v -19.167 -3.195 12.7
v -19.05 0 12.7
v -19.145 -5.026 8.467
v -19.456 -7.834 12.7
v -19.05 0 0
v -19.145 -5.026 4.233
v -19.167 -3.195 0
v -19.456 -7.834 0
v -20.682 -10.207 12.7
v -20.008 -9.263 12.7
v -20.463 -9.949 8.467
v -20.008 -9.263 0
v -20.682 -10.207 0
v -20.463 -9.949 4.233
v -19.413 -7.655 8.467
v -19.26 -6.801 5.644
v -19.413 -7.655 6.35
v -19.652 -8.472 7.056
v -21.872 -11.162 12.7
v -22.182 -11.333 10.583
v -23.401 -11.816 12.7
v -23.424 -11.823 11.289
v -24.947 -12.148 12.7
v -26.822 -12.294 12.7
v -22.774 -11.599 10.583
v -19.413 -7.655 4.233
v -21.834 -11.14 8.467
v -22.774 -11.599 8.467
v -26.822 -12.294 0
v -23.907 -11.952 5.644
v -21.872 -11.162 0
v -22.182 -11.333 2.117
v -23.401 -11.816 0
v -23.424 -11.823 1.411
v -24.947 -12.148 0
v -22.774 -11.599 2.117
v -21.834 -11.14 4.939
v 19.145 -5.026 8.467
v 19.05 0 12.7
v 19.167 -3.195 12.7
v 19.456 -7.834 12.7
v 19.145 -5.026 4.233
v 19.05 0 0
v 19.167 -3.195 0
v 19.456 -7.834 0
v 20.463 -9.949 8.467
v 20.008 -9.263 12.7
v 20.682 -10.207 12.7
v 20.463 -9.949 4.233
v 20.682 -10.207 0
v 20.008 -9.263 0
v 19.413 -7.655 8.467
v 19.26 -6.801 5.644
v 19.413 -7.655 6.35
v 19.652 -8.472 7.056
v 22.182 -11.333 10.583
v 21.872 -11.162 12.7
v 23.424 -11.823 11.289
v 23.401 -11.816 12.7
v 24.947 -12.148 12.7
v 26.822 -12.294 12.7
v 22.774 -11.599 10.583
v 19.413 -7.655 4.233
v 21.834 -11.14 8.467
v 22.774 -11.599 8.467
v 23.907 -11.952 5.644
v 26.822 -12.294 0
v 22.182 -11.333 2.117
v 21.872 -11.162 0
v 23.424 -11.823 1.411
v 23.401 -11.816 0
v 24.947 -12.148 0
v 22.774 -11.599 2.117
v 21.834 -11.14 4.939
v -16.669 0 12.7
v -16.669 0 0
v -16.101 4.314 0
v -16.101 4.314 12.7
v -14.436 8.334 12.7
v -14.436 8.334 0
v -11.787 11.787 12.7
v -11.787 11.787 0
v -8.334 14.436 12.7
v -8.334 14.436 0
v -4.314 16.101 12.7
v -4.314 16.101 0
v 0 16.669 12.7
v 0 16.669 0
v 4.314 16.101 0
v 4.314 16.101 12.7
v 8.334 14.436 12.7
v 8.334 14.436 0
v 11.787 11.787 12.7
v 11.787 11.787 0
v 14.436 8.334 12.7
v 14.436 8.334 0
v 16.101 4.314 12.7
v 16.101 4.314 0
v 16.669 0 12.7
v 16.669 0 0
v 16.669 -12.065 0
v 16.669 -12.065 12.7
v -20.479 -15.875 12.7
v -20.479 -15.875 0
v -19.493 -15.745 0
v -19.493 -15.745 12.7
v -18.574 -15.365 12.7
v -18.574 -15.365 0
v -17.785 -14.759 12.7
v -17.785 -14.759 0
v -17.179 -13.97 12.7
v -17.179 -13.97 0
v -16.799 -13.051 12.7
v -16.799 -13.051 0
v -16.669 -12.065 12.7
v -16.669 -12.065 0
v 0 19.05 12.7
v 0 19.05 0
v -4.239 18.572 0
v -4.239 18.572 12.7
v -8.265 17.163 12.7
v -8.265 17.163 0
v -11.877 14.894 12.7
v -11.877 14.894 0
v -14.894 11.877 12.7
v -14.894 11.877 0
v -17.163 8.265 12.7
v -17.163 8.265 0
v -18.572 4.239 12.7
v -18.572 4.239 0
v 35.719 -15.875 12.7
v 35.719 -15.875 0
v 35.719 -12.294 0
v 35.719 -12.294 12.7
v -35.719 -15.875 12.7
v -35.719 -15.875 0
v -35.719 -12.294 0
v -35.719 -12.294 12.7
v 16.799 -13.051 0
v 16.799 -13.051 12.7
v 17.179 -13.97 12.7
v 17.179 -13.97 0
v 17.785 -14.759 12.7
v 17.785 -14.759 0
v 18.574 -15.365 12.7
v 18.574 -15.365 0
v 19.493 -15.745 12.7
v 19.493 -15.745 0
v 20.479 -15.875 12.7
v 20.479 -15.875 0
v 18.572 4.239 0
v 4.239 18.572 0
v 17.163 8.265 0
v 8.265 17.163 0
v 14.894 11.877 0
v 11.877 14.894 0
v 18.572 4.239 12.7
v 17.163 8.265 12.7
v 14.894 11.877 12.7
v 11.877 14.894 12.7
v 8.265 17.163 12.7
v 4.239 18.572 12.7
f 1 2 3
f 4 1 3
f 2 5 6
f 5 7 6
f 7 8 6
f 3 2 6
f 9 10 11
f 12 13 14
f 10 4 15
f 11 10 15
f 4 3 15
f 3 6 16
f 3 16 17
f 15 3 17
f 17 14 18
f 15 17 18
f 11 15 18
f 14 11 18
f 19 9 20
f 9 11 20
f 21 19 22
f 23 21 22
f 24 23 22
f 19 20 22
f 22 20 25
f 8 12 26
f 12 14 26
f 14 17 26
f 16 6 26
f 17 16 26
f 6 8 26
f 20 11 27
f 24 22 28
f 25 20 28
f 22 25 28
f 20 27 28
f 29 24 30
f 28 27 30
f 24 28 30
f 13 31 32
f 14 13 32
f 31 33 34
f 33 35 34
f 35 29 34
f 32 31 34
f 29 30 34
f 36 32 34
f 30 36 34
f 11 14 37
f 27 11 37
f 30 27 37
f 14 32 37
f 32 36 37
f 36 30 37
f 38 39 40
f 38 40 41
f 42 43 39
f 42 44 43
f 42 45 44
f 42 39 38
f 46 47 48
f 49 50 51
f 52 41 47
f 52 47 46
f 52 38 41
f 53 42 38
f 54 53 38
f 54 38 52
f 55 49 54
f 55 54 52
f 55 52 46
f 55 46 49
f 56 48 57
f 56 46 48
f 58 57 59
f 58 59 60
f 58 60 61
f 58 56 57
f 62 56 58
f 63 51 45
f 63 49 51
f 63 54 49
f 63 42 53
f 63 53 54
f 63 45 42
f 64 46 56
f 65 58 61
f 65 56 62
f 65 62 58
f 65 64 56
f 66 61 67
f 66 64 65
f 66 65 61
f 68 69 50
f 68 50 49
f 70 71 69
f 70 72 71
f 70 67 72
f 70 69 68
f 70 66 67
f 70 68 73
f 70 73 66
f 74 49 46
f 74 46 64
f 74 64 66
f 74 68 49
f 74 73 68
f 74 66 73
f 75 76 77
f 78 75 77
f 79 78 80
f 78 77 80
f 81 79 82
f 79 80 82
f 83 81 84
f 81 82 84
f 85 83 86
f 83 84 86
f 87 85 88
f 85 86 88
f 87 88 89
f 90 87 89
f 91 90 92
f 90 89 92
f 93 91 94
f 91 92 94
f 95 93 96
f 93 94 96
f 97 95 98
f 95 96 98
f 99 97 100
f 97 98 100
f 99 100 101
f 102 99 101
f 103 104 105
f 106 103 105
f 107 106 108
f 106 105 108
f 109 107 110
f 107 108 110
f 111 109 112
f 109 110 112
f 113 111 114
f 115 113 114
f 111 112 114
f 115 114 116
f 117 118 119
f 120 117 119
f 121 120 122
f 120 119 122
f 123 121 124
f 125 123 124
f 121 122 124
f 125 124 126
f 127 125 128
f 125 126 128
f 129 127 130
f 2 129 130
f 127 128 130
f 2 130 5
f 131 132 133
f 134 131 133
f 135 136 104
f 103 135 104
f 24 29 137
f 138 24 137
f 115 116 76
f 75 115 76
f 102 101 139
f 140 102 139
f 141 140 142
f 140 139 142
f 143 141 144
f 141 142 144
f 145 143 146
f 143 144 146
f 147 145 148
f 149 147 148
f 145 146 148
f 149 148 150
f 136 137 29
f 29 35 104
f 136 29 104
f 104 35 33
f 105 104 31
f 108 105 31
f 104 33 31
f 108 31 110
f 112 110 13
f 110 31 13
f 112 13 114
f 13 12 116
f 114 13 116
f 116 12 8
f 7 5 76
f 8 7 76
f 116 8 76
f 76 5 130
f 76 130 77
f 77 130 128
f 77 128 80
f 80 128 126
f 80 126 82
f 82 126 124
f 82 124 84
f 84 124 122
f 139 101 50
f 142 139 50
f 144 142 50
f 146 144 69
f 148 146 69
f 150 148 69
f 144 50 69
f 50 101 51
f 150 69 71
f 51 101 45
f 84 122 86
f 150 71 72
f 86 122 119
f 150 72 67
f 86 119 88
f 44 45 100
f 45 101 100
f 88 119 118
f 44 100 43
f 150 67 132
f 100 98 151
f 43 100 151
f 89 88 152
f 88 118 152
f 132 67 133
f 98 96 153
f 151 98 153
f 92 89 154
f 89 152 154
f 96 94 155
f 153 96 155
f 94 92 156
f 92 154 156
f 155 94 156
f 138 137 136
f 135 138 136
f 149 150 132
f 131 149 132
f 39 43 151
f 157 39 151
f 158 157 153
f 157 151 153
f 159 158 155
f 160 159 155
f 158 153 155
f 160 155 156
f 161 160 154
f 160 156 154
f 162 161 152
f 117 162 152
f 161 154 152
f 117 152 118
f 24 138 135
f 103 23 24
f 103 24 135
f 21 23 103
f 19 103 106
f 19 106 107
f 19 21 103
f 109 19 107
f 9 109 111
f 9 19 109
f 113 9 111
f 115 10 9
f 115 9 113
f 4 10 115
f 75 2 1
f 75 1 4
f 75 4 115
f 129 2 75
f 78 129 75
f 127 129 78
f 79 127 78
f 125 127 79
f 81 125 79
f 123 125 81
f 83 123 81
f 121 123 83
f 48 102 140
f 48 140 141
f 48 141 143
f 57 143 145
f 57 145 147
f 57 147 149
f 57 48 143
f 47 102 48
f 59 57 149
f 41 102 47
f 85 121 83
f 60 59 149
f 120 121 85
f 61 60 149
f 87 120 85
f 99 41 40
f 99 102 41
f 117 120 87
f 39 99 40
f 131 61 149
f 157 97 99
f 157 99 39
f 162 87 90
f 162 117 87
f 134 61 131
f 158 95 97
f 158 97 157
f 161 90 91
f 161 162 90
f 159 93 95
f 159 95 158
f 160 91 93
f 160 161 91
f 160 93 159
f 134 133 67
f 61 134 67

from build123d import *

# Parameters (mm, degrees)
F1_DEPTH = 12.7


with BuildPart() as f1:
    # F0 (on Top) → F1 (new body)
    with BuildSketch(Plane.XY):
        with BuildLine():
            ThreePointArc((0, 16.66875), (11.786586, 11.786586), (16.66875, 0))
            Line((16.66875, 0), (16.66875, -12.065))
            ThreePointArc((16.66875, -12.065), (17.784673, -14.759077), (20.47875, -15.875))
            Line((20.47875, -15.875), (35.71875, -15.875))
            Line((35.71875, -15.875), (35.71875, -12.293821))
            Line((35.71875, -12.293821), (26.822409, -12.293821))
            add(Edge.make_bspline(
                [(19.05, 0), (19.807434, -4.250921), (16.66875, -12.065), (26.822409, -12.293821)],
                knots=[0, 0, 0, 0, 14.544702, 14.544702, 14.544702, 14.544702], degree=3))
            ThreePointArc((19.05, 0), (13.470384, 13.470384), (0, 19.05))
            ThreePointArc((0, 19.05), (-13.470384, 13.470384), (-19.05, 0))
            add(Edge.make_bspline(
                [(-19.05, 0), (-19.807434, -4.250921), (-16.66875, -12.065), (-26.822409, -12.293821)],
                knots=[0, 0, 0, 0, 14.544702, 14.544702, 14.544702, 14.544702], degree=3))
            Line((-26.822409, -12.293821), (-35.71875, -12.293821))
            Line((-35.71875, -12.293821), (-35.71875, -15.875))
            Line((-35.71875, -15.875), (-20.47875, -15.875))
            ThreePointArc((-20.47875, -15.875), (-17.784673, -14.759077), (-16.66875, -12.065))
            Line((-16.66875, -12.065), (-16.66875, 0))
            ThreePointArc((-16.66875, 0), (-11.786586, 11.786586), (0, 16.66875))
        make_face()
    extrude(amount=F1_DEPTH)


solid = f1.part
